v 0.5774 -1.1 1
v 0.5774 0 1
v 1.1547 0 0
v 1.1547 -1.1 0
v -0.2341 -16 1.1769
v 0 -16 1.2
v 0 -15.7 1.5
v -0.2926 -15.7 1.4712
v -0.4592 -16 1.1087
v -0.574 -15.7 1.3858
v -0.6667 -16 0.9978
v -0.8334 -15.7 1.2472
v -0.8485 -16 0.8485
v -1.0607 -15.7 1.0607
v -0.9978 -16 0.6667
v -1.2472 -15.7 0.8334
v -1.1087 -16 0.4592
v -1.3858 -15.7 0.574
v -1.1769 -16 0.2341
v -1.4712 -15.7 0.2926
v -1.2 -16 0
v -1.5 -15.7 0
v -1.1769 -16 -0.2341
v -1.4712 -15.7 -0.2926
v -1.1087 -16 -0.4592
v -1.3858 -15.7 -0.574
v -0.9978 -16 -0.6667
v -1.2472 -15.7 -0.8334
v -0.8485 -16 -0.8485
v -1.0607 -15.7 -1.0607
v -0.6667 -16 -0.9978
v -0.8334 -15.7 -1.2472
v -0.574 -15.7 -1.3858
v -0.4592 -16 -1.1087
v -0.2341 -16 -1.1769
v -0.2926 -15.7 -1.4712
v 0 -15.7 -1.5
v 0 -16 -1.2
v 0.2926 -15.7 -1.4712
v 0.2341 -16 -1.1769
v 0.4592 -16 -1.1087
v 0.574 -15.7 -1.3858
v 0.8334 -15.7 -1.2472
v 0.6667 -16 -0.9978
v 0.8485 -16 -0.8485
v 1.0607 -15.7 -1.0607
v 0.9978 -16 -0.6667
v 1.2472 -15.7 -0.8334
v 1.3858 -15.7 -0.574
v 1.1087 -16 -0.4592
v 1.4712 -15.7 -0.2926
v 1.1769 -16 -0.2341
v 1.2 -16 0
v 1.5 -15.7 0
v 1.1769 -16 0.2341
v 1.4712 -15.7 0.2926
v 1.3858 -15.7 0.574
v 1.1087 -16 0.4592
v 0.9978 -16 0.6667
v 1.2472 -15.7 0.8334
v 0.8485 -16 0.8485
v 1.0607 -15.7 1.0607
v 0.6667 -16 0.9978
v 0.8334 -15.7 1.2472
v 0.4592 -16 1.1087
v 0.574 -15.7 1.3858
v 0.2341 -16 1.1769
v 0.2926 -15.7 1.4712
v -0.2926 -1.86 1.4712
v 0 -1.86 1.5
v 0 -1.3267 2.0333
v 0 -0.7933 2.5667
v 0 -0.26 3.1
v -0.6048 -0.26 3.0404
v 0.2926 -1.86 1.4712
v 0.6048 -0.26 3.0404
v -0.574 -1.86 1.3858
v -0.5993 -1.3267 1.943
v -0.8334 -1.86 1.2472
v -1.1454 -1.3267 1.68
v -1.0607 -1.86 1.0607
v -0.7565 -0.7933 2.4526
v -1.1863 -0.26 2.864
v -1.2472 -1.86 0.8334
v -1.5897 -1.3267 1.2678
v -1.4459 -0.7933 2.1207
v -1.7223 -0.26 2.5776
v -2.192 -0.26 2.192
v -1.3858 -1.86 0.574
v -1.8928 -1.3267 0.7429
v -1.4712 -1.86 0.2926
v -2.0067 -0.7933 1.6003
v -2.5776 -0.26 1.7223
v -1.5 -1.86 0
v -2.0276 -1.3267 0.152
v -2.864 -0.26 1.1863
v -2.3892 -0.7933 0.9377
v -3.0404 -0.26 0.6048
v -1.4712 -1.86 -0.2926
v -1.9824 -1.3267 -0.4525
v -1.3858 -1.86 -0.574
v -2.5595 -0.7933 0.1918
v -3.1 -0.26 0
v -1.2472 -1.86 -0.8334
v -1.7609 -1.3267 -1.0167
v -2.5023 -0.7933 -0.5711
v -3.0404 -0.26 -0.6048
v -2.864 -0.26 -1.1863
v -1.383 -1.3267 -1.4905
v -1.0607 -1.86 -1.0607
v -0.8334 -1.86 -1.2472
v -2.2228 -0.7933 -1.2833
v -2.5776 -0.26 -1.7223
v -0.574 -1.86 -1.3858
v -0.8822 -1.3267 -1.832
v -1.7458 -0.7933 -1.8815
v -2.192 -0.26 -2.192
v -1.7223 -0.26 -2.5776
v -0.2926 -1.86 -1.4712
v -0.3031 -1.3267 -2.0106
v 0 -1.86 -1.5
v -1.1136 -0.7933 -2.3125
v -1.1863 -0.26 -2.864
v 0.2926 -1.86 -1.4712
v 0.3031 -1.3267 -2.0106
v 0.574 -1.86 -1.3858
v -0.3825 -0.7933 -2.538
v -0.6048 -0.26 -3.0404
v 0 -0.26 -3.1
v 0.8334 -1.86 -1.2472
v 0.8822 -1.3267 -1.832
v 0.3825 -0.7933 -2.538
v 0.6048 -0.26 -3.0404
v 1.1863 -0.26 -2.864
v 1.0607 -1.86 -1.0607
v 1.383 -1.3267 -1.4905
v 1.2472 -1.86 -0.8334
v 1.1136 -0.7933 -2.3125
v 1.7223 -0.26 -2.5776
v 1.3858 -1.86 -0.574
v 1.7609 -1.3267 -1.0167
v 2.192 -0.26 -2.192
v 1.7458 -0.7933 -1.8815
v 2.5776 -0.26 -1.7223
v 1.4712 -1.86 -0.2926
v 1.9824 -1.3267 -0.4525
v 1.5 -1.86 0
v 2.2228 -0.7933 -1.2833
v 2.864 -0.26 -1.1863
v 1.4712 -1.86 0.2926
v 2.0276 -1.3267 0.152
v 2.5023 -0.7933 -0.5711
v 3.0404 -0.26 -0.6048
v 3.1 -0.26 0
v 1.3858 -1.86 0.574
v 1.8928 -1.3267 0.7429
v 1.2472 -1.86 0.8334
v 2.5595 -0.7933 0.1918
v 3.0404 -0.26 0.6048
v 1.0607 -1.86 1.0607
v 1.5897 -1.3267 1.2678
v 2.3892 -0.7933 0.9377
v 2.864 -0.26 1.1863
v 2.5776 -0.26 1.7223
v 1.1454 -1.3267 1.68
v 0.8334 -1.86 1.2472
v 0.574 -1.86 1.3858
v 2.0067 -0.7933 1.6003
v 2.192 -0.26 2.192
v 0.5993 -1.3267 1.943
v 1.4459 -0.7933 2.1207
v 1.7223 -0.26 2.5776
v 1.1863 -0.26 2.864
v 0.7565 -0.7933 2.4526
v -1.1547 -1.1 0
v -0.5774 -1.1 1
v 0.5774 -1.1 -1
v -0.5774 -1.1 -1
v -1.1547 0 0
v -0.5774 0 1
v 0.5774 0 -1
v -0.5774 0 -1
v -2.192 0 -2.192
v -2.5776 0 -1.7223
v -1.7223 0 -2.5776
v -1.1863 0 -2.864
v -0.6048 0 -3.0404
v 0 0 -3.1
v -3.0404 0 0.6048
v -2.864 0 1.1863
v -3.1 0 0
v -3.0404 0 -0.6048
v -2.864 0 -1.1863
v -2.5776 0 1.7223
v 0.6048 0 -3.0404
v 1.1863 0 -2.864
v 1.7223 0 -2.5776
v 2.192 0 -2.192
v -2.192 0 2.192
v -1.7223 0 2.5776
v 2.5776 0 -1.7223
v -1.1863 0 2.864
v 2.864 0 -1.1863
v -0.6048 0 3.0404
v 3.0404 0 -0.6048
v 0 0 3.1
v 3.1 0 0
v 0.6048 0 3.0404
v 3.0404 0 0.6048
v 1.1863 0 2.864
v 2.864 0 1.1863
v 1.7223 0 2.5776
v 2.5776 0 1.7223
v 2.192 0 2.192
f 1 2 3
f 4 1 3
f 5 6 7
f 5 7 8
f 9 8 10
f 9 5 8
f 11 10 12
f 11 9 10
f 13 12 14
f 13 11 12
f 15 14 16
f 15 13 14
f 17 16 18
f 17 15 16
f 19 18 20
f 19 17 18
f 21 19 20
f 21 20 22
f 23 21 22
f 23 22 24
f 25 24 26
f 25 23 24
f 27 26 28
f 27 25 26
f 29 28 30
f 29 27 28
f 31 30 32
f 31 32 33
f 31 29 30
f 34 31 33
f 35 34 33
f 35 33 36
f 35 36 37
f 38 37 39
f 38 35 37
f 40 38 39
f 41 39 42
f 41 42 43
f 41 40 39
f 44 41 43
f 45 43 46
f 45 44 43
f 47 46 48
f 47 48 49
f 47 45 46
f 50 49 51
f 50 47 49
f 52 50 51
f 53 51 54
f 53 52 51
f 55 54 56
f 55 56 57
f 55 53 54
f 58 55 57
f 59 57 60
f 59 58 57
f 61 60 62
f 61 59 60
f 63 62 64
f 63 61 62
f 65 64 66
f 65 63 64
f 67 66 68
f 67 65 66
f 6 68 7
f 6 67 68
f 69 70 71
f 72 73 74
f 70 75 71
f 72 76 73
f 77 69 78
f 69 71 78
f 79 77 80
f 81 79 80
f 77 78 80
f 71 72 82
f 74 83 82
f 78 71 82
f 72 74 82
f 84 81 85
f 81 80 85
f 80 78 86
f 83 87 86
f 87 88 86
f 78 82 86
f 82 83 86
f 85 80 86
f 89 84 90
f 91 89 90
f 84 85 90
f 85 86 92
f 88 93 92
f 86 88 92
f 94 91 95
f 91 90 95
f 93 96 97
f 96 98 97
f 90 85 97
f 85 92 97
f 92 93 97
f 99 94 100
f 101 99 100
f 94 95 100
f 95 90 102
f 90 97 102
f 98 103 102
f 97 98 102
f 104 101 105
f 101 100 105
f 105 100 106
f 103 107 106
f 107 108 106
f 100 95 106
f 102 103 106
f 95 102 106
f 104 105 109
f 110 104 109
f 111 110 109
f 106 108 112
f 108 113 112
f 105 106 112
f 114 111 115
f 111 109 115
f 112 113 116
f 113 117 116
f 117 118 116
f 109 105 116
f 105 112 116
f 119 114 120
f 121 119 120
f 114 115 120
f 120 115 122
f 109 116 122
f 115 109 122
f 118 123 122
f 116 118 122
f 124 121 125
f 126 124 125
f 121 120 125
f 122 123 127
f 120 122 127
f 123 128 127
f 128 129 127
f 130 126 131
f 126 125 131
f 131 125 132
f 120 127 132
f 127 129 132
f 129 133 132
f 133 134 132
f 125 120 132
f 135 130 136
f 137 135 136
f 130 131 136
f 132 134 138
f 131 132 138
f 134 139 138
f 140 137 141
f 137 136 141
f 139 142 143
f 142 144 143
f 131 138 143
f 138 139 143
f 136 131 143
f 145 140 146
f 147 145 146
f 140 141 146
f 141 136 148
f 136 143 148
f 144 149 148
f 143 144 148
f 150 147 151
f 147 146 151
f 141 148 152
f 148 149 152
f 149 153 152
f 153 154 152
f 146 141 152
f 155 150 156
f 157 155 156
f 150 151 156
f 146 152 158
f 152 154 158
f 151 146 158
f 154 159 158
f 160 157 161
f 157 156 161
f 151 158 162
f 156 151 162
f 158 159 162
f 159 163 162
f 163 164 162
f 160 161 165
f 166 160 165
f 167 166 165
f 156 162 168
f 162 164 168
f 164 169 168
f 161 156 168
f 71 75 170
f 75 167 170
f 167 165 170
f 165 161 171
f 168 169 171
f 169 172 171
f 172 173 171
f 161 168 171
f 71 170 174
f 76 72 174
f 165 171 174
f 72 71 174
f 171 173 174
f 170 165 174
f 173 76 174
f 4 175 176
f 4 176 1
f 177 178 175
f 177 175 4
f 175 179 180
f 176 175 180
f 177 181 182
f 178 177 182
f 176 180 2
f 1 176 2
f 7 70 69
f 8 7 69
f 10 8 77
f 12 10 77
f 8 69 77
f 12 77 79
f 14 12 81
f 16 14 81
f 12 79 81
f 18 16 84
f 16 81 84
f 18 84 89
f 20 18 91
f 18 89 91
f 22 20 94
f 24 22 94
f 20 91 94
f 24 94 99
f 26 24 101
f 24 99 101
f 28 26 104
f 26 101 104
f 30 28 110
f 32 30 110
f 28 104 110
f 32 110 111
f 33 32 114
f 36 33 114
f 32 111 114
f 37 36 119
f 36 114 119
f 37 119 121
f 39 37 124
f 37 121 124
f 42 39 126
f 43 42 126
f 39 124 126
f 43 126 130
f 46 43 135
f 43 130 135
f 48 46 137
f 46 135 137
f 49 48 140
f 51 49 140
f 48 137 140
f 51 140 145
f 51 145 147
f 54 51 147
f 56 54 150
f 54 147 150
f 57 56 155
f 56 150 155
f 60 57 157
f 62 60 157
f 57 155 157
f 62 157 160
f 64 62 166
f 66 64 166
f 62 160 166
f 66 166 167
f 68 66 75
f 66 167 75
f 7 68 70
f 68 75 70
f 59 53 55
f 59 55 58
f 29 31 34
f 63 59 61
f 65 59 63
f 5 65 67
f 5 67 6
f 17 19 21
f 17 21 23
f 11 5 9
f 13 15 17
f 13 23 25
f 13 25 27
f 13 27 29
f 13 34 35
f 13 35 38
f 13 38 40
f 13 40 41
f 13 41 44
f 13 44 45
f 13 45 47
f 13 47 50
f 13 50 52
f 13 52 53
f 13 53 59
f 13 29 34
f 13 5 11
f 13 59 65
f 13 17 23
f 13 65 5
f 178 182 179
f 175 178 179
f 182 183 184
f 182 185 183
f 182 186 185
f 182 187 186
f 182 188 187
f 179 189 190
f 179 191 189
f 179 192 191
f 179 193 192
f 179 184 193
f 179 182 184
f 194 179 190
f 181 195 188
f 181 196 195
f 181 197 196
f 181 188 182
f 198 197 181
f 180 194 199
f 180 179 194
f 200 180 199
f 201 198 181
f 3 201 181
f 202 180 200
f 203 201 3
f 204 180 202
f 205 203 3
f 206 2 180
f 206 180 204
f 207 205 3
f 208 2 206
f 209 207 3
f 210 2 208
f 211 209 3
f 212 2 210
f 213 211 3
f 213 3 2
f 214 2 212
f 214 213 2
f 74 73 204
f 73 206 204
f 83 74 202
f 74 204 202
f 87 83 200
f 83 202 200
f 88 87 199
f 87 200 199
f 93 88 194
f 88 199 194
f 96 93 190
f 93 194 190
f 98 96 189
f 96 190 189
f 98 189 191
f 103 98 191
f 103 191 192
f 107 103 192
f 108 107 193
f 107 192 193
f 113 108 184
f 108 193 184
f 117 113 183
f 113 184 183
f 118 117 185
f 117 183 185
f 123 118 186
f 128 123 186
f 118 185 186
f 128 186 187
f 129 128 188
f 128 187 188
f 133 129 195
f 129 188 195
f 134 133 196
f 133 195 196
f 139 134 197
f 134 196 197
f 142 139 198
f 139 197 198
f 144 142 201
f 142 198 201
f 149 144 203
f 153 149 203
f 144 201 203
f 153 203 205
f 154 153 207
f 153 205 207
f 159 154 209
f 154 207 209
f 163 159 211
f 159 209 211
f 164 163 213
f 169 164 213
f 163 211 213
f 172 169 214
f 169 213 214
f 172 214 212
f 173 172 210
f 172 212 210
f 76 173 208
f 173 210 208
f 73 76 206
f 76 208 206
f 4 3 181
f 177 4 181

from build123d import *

# Parameters (mm, degrees)
ESQUISSE_TETE_R         = 3.36
EXTRUSION_TETE_DEPTH    = 1.86
ENL_V_MAT_EXTRU_1_DEPTH = 1.1
ESQUISSE_CORPS_R        = 1.5
EXTRUSION_CORPS_DEPTH   = 14.14
CHANFREIN_SIZE          = 0.3


with BuildPart() as part:
    # Esquisse TETE → Extrusion TETE (new body)
    with BuildSketch(Plane(origin=(0, 0, 0), x_dir=(1, 0, 0), z_dir=(0, 1, 0))):
        with Locations(Location((0, 0, 0), (0, 0, 270))):
            Circle(ESQUISSE_TETE_R)
    extrude(amount=-EXTRUSION_TETE_DEPTH)

    # Esquisse1 → Enlèv. mat.-Extru.1 (cut)
    with BuildSketch(Plane(origin=(0, 0, 0), x_dir=(1, 0, 0), z_dir=(0, 1, 0))):
        Polygon((0.577350269, -1), (1.154700538, 0), (0.577350269, 1), (-0.577350269, 1), (-1.154700538, 0), (-0.577350269, -1), align=None)
    extrude(amount=-ENL_V_MAT_EXTRU_1_DEPTH, mode=Mode.SUBTRACT)

    # Esquisse CORPS → Extrusion CORPS (add)
    with BuildSketch(Plane.XZ.offset(1.86)):
        with Locations(Location((0, 0, 0), (0, 0, 90))):
            Circle(ESQUISSE_CORPS_R)
    extrude(amount=EXTRUSION_CORPS_DEPTH)

    # Esquisse FRAISAGE → Enlèvement de matière-Révolution1 (revolve, cut)
    with BuildSketch(Plane(origin=(0, 0, 0), x_dir=(0, 0, -1), z_dir=(1, 0, 0))):
        Polygon((-1.5, -1.86), (-3.1, -0.26), (-3.1, 0), (-3.36, 0), (-3.36, -1.86), align=None)
    revolve(axis=Axis((0, 0, 0), (0, -1, 0)), mode=Mode.SUBTRACT)

    # Chanfrein
    chanfrein_edges = [part.edges().sort_by_distance(p)[0] for p in [
        (0, -16, -1.5),
    ]]
    chamfer(chanfrein_edges, length=CHANFREIN_SIZE)


solid = part.part
